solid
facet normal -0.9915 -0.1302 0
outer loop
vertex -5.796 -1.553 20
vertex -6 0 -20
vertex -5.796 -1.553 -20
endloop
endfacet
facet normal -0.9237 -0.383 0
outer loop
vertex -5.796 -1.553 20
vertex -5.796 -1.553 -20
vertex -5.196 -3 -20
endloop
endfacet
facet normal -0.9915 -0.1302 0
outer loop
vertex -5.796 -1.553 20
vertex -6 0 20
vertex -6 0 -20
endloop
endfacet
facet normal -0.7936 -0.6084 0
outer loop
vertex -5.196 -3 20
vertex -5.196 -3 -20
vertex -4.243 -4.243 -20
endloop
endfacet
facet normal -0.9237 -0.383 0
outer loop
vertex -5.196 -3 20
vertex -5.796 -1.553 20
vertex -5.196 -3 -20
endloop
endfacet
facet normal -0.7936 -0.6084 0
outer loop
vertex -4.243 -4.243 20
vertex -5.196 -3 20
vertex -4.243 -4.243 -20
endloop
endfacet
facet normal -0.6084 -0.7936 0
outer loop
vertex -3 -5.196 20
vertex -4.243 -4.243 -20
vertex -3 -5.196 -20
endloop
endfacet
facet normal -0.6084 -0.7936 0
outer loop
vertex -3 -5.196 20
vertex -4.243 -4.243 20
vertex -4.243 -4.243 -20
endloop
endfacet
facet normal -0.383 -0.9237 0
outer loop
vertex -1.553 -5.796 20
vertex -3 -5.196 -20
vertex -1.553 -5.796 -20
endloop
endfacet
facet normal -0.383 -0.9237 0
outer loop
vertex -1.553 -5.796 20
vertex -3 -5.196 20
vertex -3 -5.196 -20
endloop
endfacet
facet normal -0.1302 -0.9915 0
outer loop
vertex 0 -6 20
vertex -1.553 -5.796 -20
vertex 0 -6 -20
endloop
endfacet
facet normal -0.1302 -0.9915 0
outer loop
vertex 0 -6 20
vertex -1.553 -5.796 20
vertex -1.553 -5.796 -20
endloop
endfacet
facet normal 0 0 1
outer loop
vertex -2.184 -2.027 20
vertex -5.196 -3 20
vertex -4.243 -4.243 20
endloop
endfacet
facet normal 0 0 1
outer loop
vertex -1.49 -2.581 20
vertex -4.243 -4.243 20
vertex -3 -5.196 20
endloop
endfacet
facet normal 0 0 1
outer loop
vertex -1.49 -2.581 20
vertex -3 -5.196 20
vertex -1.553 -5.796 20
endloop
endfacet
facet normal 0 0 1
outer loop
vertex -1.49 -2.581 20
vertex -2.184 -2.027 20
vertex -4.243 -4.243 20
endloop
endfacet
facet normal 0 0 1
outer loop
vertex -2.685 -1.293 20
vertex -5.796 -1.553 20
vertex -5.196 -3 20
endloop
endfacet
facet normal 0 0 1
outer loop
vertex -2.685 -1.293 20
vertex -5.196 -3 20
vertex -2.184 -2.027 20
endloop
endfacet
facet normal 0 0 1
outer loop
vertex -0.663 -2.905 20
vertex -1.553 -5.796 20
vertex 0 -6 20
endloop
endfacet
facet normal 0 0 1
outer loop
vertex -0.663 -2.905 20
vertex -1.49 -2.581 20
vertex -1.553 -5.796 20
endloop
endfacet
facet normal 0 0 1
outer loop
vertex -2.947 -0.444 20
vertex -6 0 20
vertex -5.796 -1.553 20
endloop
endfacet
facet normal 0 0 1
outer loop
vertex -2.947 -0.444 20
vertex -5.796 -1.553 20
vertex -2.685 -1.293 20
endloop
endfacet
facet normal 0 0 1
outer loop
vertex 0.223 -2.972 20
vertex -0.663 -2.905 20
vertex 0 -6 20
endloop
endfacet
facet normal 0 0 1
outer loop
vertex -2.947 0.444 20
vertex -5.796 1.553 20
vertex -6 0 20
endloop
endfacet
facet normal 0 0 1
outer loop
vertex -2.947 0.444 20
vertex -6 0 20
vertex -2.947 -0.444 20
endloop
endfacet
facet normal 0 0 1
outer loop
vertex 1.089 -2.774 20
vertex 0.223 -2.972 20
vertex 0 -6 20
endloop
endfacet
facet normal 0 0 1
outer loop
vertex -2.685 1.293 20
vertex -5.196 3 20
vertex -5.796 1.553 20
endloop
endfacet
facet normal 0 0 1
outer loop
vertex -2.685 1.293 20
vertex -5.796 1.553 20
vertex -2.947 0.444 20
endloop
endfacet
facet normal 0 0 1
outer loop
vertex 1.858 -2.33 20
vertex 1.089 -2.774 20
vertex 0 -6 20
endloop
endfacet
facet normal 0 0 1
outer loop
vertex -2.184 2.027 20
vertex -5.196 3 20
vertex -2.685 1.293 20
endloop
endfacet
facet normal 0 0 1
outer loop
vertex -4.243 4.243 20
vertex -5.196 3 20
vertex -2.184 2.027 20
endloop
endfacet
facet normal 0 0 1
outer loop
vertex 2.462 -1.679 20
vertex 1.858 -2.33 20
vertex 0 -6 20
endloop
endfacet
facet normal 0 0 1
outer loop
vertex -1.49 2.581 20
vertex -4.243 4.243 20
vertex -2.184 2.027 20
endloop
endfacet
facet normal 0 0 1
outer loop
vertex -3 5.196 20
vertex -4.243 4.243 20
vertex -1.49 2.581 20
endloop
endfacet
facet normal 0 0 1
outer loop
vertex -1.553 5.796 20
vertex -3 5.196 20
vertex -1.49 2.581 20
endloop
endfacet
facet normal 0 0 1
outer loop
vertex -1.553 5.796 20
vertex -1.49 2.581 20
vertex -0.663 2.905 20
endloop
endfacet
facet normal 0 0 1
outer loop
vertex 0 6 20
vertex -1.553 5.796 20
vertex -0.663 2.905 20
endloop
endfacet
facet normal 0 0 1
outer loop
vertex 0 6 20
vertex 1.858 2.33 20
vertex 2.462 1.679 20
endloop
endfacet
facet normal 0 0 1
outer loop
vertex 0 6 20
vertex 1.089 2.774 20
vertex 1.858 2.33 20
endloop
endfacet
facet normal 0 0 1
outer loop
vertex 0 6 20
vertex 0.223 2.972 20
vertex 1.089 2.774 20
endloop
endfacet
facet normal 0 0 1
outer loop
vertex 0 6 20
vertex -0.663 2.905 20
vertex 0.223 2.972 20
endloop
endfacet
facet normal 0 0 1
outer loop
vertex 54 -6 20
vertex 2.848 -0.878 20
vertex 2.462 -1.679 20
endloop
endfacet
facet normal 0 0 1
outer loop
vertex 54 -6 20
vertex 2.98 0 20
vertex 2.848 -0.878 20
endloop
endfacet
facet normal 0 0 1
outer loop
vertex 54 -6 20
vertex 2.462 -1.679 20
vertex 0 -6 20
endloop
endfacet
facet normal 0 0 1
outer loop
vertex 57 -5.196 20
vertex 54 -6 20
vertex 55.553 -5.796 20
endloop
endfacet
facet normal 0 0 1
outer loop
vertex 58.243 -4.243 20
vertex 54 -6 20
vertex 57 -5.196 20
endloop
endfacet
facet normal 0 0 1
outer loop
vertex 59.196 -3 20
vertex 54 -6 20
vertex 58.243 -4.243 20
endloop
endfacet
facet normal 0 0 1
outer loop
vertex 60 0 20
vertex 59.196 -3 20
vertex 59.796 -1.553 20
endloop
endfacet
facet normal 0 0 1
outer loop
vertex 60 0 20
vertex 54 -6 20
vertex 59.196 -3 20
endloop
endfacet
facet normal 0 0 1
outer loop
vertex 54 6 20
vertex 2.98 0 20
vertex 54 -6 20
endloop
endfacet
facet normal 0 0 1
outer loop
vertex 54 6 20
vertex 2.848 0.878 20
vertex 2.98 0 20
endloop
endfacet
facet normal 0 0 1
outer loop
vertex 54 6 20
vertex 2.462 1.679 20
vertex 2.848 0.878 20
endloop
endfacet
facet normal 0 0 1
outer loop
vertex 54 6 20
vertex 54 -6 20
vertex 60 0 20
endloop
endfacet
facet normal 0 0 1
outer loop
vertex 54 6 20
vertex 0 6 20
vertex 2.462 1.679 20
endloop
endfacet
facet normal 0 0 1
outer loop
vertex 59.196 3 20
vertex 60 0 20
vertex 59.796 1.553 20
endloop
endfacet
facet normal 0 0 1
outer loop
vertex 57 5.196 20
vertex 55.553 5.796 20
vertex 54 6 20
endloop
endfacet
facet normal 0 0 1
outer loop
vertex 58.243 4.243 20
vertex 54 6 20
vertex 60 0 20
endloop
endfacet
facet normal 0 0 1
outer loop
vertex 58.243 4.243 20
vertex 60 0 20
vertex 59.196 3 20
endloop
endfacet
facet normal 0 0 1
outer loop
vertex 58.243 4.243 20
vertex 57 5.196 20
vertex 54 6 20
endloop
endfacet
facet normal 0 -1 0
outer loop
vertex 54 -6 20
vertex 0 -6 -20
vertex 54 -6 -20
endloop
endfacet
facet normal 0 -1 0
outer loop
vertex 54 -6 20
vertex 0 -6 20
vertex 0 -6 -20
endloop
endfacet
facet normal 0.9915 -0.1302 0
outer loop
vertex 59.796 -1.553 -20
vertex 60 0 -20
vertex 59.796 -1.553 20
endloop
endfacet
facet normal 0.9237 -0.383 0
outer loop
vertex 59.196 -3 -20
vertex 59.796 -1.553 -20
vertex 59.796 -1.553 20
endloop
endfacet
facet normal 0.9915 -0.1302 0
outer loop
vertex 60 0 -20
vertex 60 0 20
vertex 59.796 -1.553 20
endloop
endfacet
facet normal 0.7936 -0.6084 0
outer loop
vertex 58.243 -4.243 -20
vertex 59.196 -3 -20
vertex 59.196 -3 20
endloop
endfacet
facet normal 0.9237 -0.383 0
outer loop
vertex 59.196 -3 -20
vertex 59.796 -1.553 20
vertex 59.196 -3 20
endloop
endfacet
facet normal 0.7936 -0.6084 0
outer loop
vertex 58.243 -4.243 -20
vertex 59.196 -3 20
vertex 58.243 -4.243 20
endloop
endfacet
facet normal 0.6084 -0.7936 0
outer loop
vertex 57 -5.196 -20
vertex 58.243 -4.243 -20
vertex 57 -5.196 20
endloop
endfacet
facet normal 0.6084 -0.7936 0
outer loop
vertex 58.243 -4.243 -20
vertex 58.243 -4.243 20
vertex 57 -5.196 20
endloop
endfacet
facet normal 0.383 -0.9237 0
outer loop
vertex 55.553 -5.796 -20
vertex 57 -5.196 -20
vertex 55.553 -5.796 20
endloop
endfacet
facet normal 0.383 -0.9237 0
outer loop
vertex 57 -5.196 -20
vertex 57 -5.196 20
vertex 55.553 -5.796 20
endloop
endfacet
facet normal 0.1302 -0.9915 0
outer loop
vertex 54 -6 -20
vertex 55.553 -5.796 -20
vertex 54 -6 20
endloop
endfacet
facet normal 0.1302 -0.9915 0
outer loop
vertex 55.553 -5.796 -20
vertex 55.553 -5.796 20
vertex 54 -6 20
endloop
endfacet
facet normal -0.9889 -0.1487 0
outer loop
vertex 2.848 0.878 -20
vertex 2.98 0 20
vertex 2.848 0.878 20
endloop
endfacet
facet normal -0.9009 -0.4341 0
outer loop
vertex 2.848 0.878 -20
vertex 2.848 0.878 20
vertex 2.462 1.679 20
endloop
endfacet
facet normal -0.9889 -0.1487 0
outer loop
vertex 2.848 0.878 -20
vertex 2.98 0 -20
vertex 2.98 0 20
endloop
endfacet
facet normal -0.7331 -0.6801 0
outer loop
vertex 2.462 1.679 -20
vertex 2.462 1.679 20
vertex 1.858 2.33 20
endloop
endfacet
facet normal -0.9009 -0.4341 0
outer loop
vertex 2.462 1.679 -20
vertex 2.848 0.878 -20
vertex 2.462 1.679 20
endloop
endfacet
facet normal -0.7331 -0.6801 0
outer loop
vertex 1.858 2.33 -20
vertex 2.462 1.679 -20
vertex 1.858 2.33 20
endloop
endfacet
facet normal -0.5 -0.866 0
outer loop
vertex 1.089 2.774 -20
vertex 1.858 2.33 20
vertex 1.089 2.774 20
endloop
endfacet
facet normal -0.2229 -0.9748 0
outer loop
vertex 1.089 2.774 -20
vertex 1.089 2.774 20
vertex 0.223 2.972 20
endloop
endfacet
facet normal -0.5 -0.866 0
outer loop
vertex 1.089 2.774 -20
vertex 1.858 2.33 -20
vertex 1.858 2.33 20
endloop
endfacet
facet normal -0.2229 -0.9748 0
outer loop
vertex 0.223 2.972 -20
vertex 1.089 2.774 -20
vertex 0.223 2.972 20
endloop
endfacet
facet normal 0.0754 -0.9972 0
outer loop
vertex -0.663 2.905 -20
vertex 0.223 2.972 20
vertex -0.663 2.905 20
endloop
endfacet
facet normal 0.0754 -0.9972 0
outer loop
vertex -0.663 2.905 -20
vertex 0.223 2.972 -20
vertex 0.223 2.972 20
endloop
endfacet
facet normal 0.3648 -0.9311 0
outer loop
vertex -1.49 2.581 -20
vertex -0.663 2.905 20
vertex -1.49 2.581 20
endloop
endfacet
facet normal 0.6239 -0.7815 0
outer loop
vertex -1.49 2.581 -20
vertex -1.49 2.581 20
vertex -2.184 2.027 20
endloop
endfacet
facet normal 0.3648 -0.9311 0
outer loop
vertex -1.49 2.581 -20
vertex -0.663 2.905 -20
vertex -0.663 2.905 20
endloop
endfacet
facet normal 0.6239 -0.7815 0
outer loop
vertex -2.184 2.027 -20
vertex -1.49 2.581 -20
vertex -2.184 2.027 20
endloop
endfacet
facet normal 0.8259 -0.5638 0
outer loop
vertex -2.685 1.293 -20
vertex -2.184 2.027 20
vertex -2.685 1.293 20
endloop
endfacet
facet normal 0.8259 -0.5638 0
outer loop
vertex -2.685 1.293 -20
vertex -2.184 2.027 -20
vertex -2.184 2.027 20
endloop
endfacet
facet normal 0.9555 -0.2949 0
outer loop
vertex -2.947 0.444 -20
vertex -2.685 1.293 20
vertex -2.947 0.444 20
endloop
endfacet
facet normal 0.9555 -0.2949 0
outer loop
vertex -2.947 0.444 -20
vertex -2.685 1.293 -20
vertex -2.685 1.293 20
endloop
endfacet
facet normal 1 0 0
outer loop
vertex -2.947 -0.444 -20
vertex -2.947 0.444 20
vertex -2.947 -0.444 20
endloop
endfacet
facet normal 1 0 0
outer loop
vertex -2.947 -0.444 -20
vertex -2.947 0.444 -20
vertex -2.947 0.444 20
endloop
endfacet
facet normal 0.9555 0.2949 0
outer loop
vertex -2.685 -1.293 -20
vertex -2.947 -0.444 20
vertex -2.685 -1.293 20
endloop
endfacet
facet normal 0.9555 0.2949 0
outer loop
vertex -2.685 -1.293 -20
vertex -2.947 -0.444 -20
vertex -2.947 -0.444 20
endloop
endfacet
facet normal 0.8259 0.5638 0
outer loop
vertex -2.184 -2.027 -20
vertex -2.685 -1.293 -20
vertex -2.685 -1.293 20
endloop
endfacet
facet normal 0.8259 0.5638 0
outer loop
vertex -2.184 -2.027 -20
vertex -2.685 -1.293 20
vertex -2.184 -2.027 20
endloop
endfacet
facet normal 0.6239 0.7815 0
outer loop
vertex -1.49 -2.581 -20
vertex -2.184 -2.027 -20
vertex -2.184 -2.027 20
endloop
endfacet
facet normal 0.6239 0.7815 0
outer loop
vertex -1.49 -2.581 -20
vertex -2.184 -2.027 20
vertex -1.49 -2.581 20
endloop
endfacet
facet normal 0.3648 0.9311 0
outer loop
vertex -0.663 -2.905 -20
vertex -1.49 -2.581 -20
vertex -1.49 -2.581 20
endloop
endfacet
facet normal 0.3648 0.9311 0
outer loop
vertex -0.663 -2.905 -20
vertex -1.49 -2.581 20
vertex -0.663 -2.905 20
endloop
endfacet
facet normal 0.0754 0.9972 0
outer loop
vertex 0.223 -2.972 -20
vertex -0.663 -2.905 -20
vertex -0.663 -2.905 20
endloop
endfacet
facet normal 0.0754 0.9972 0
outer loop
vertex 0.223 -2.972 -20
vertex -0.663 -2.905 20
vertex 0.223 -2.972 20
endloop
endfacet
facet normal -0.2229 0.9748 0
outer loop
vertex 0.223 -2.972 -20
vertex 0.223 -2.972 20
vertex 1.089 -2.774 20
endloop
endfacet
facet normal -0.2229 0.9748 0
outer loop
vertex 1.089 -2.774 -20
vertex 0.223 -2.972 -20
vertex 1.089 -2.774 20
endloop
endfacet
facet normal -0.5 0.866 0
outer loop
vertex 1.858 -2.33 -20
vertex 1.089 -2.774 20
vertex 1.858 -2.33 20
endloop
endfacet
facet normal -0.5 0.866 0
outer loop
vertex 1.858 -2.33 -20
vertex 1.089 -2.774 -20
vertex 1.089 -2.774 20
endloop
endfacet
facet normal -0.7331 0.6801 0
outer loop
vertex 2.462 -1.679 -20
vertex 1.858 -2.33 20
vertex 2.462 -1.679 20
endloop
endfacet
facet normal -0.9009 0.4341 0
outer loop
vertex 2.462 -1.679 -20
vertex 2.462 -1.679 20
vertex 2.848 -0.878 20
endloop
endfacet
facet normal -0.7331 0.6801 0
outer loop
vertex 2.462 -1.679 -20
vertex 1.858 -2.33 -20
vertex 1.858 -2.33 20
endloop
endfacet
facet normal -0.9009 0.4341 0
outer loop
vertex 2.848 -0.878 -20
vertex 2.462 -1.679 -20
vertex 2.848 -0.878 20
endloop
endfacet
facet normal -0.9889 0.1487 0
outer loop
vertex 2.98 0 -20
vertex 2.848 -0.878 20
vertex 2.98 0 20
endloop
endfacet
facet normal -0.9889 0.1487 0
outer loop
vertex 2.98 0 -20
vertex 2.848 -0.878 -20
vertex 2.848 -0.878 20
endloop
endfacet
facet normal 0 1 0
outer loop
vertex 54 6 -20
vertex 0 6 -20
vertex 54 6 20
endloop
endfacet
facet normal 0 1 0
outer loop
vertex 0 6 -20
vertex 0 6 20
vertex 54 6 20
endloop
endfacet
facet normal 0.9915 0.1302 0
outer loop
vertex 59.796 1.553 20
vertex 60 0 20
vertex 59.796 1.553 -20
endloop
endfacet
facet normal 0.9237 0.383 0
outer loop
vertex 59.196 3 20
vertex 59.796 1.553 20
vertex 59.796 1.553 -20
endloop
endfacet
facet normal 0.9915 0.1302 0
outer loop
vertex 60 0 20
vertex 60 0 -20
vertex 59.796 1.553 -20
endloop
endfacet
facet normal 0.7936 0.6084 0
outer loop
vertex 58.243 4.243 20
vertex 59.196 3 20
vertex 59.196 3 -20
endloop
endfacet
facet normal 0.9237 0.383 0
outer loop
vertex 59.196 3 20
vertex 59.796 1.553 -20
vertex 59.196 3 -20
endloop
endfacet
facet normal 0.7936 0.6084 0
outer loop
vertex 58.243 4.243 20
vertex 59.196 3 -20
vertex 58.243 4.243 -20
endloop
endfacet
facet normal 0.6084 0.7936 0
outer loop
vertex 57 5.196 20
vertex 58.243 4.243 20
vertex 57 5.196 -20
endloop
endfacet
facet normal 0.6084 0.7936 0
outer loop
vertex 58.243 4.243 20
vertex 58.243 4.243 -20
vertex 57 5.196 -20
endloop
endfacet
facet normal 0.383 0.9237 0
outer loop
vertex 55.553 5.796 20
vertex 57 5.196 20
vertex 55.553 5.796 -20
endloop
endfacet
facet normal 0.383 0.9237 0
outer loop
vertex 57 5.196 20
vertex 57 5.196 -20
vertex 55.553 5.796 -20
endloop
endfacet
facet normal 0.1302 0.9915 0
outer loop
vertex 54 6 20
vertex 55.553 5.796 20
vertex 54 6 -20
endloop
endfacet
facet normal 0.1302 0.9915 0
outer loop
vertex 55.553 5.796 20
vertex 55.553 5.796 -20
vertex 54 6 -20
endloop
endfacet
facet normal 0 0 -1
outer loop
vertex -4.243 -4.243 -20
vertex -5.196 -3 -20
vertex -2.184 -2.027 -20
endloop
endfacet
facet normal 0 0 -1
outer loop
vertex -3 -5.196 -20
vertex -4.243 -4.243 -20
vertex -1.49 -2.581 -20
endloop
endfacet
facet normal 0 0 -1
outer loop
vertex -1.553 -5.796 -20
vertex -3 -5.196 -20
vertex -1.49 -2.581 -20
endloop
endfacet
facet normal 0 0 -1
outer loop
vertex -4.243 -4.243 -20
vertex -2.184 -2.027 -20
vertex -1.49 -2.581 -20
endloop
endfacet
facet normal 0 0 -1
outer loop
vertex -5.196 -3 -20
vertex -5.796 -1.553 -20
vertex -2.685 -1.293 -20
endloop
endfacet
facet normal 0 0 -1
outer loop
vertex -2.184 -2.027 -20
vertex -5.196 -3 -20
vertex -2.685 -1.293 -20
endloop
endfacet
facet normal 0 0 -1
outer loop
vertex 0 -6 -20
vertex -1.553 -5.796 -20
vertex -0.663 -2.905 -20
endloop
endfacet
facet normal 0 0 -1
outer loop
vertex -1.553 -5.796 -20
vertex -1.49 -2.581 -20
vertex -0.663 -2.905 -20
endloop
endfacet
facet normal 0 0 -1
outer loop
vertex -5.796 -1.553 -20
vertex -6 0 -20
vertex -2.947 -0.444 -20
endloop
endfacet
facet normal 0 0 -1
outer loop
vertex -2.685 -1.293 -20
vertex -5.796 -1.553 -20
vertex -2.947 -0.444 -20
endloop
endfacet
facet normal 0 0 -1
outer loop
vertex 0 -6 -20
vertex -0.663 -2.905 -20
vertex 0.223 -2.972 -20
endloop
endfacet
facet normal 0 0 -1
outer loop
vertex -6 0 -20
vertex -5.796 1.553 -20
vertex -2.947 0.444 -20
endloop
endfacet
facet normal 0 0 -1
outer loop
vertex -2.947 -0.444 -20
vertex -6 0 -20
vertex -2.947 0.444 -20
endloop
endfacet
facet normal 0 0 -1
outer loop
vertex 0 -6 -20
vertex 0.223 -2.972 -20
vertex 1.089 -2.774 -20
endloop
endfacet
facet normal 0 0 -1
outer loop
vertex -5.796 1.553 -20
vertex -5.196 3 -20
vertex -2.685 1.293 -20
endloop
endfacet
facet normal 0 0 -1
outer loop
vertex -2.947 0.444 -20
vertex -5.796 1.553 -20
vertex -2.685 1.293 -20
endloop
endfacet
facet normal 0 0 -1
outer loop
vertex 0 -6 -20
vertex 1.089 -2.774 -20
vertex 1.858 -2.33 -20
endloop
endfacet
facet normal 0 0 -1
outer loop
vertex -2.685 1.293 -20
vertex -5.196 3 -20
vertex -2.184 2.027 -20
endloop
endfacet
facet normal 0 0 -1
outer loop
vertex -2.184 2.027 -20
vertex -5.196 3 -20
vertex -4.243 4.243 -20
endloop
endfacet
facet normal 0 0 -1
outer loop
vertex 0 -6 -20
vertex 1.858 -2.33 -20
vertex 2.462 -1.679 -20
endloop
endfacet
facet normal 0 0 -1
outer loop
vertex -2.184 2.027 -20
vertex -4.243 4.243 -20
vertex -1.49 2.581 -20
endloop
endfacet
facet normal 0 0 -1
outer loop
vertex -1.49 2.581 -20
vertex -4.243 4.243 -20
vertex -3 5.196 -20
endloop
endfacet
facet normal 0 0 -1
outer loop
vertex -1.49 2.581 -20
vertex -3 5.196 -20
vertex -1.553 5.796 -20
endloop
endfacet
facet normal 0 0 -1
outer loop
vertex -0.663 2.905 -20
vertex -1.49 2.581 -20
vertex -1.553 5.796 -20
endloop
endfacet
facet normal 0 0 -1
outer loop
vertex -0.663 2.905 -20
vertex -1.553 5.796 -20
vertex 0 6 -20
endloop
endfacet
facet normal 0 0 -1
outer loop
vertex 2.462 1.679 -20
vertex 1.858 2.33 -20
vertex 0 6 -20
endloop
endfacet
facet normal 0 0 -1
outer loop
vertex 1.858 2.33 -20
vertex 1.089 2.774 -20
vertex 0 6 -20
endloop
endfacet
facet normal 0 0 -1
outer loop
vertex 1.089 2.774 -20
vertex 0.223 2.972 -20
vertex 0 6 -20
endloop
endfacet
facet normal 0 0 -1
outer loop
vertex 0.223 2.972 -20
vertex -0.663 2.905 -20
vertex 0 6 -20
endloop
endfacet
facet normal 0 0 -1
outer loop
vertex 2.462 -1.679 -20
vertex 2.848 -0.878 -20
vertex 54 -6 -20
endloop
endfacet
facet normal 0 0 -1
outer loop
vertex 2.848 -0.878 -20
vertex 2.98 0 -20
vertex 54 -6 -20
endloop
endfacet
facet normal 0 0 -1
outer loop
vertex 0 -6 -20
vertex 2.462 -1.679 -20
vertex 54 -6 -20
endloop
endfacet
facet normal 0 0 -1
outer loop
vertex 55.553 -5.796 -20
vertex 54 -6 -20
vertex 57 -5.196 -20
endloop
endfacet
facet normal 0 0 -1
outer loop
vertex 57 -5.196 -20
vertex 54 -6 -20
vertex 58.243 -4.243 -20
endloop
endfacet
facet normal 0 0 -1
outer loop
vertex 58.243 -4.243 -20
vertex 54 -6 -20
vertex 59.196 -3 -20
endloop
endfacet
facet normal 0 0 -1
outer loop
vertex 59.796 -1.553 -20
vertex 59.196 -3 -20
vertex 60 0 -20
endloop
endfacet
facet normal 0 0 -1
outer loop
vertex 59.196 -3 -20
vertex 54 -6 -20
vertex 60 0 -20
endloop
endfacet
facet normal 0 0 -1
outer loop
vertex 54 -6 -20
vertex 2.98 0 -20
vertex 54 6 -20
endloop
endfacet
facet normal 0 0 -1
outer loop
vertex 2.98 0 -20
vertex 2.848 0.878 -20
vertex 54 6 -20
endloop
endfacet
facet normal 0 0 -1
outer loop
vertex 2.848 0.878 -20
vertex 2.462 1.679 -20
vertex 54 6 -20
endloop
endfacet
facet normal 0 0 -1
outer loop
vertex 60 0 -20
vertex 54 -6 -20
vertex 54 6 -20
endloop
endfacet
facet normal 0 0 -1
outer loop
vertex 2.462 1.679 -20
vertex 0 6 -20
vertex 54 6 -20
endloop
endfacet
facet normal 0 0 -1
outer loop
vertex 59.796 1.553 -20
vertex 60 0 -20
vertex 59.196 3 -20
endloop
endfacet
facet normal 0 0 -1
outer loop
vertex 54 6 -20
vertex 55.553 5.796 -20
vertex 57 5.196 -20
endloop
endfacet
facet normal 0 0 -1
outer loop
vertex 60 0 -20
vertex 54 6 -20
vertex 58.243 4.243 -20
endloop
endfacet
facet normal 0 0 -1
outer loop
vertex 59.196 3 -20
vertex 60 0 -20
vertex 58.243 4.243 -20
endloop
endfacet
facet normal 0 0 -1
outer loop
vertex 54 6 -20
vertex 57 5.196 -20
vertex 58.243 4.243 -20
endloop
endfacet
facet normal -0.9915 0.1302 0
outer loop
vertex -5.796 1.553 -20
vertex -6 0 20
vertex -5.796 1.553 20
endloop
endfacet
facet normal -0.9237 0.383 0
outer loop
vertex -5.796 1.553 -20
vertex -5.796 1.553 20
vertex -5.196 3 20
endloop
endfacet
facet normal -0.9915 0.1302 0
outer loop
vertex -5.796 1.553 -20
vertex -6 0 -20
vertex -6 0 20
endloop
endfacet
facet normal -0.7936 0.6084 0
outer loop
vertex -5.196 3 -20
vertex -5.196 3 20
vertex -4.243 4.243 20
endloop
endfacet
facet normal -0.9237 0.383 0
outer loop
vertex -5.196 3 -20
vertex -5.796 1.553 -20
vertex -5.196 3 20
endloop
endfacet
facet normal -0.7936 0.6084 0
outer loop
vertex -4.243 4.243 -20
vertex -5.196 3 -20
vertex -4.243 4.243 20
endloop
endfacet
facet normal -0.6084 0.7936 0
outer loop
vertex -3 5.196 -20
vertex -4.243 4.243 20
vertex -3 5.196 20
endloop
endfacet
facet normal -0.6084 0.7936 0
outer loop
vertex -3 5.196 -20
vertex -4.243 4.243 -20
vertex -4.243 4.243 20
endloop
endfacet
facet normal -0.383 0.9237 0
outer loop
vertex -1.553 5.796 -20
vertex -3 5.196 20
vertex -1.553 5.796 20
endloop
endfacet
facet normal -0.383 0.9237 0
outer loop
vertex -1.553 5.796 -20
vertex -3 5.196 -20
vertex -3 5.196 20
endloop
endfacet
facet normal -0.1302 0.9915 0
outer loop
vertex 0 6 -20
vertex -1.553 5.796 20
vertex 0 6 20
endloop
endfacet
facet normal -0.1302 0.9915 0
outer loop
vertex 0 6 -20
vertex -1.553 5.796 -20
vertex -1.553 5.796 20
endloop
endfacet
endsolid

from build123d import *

# Parameters (mm, degrees)
SKETCH1_W           = 66
SKETCH1_H           = 12
SKETCH1_R           = 2.98
BOSS_EXTRUDE1_DEPTH = 20
FILLET2_R           = 6


with BuildPart() as part:
    # Sketch1 → Boss-Extrude1 (new, symmetric)
    with BuildSketch(Plane.XY):
        with Locations((27, 0)):
            Rectangle(SKETCH1_W, SKETCH1_H)
        Circle(SKETCH1_R, mode=Mode.SUBTRACT)
    extrude(amount=BOSS_EXTRUDE1_DEPTH, both=True)

    # Fillet2
    fillet2_edges = [part.edges().sort_by_distance(p)[0] for p in [
        (60, -6, 0),
        (60, 6, 0),
        (-6, -6, 0),
        (-6, 6, 0),
    ]]
    fillet(fillet2_edges, radius=FILLET2_R - 0.0001)  # a hair under: the kernel refuses the full size


solid = part.part
